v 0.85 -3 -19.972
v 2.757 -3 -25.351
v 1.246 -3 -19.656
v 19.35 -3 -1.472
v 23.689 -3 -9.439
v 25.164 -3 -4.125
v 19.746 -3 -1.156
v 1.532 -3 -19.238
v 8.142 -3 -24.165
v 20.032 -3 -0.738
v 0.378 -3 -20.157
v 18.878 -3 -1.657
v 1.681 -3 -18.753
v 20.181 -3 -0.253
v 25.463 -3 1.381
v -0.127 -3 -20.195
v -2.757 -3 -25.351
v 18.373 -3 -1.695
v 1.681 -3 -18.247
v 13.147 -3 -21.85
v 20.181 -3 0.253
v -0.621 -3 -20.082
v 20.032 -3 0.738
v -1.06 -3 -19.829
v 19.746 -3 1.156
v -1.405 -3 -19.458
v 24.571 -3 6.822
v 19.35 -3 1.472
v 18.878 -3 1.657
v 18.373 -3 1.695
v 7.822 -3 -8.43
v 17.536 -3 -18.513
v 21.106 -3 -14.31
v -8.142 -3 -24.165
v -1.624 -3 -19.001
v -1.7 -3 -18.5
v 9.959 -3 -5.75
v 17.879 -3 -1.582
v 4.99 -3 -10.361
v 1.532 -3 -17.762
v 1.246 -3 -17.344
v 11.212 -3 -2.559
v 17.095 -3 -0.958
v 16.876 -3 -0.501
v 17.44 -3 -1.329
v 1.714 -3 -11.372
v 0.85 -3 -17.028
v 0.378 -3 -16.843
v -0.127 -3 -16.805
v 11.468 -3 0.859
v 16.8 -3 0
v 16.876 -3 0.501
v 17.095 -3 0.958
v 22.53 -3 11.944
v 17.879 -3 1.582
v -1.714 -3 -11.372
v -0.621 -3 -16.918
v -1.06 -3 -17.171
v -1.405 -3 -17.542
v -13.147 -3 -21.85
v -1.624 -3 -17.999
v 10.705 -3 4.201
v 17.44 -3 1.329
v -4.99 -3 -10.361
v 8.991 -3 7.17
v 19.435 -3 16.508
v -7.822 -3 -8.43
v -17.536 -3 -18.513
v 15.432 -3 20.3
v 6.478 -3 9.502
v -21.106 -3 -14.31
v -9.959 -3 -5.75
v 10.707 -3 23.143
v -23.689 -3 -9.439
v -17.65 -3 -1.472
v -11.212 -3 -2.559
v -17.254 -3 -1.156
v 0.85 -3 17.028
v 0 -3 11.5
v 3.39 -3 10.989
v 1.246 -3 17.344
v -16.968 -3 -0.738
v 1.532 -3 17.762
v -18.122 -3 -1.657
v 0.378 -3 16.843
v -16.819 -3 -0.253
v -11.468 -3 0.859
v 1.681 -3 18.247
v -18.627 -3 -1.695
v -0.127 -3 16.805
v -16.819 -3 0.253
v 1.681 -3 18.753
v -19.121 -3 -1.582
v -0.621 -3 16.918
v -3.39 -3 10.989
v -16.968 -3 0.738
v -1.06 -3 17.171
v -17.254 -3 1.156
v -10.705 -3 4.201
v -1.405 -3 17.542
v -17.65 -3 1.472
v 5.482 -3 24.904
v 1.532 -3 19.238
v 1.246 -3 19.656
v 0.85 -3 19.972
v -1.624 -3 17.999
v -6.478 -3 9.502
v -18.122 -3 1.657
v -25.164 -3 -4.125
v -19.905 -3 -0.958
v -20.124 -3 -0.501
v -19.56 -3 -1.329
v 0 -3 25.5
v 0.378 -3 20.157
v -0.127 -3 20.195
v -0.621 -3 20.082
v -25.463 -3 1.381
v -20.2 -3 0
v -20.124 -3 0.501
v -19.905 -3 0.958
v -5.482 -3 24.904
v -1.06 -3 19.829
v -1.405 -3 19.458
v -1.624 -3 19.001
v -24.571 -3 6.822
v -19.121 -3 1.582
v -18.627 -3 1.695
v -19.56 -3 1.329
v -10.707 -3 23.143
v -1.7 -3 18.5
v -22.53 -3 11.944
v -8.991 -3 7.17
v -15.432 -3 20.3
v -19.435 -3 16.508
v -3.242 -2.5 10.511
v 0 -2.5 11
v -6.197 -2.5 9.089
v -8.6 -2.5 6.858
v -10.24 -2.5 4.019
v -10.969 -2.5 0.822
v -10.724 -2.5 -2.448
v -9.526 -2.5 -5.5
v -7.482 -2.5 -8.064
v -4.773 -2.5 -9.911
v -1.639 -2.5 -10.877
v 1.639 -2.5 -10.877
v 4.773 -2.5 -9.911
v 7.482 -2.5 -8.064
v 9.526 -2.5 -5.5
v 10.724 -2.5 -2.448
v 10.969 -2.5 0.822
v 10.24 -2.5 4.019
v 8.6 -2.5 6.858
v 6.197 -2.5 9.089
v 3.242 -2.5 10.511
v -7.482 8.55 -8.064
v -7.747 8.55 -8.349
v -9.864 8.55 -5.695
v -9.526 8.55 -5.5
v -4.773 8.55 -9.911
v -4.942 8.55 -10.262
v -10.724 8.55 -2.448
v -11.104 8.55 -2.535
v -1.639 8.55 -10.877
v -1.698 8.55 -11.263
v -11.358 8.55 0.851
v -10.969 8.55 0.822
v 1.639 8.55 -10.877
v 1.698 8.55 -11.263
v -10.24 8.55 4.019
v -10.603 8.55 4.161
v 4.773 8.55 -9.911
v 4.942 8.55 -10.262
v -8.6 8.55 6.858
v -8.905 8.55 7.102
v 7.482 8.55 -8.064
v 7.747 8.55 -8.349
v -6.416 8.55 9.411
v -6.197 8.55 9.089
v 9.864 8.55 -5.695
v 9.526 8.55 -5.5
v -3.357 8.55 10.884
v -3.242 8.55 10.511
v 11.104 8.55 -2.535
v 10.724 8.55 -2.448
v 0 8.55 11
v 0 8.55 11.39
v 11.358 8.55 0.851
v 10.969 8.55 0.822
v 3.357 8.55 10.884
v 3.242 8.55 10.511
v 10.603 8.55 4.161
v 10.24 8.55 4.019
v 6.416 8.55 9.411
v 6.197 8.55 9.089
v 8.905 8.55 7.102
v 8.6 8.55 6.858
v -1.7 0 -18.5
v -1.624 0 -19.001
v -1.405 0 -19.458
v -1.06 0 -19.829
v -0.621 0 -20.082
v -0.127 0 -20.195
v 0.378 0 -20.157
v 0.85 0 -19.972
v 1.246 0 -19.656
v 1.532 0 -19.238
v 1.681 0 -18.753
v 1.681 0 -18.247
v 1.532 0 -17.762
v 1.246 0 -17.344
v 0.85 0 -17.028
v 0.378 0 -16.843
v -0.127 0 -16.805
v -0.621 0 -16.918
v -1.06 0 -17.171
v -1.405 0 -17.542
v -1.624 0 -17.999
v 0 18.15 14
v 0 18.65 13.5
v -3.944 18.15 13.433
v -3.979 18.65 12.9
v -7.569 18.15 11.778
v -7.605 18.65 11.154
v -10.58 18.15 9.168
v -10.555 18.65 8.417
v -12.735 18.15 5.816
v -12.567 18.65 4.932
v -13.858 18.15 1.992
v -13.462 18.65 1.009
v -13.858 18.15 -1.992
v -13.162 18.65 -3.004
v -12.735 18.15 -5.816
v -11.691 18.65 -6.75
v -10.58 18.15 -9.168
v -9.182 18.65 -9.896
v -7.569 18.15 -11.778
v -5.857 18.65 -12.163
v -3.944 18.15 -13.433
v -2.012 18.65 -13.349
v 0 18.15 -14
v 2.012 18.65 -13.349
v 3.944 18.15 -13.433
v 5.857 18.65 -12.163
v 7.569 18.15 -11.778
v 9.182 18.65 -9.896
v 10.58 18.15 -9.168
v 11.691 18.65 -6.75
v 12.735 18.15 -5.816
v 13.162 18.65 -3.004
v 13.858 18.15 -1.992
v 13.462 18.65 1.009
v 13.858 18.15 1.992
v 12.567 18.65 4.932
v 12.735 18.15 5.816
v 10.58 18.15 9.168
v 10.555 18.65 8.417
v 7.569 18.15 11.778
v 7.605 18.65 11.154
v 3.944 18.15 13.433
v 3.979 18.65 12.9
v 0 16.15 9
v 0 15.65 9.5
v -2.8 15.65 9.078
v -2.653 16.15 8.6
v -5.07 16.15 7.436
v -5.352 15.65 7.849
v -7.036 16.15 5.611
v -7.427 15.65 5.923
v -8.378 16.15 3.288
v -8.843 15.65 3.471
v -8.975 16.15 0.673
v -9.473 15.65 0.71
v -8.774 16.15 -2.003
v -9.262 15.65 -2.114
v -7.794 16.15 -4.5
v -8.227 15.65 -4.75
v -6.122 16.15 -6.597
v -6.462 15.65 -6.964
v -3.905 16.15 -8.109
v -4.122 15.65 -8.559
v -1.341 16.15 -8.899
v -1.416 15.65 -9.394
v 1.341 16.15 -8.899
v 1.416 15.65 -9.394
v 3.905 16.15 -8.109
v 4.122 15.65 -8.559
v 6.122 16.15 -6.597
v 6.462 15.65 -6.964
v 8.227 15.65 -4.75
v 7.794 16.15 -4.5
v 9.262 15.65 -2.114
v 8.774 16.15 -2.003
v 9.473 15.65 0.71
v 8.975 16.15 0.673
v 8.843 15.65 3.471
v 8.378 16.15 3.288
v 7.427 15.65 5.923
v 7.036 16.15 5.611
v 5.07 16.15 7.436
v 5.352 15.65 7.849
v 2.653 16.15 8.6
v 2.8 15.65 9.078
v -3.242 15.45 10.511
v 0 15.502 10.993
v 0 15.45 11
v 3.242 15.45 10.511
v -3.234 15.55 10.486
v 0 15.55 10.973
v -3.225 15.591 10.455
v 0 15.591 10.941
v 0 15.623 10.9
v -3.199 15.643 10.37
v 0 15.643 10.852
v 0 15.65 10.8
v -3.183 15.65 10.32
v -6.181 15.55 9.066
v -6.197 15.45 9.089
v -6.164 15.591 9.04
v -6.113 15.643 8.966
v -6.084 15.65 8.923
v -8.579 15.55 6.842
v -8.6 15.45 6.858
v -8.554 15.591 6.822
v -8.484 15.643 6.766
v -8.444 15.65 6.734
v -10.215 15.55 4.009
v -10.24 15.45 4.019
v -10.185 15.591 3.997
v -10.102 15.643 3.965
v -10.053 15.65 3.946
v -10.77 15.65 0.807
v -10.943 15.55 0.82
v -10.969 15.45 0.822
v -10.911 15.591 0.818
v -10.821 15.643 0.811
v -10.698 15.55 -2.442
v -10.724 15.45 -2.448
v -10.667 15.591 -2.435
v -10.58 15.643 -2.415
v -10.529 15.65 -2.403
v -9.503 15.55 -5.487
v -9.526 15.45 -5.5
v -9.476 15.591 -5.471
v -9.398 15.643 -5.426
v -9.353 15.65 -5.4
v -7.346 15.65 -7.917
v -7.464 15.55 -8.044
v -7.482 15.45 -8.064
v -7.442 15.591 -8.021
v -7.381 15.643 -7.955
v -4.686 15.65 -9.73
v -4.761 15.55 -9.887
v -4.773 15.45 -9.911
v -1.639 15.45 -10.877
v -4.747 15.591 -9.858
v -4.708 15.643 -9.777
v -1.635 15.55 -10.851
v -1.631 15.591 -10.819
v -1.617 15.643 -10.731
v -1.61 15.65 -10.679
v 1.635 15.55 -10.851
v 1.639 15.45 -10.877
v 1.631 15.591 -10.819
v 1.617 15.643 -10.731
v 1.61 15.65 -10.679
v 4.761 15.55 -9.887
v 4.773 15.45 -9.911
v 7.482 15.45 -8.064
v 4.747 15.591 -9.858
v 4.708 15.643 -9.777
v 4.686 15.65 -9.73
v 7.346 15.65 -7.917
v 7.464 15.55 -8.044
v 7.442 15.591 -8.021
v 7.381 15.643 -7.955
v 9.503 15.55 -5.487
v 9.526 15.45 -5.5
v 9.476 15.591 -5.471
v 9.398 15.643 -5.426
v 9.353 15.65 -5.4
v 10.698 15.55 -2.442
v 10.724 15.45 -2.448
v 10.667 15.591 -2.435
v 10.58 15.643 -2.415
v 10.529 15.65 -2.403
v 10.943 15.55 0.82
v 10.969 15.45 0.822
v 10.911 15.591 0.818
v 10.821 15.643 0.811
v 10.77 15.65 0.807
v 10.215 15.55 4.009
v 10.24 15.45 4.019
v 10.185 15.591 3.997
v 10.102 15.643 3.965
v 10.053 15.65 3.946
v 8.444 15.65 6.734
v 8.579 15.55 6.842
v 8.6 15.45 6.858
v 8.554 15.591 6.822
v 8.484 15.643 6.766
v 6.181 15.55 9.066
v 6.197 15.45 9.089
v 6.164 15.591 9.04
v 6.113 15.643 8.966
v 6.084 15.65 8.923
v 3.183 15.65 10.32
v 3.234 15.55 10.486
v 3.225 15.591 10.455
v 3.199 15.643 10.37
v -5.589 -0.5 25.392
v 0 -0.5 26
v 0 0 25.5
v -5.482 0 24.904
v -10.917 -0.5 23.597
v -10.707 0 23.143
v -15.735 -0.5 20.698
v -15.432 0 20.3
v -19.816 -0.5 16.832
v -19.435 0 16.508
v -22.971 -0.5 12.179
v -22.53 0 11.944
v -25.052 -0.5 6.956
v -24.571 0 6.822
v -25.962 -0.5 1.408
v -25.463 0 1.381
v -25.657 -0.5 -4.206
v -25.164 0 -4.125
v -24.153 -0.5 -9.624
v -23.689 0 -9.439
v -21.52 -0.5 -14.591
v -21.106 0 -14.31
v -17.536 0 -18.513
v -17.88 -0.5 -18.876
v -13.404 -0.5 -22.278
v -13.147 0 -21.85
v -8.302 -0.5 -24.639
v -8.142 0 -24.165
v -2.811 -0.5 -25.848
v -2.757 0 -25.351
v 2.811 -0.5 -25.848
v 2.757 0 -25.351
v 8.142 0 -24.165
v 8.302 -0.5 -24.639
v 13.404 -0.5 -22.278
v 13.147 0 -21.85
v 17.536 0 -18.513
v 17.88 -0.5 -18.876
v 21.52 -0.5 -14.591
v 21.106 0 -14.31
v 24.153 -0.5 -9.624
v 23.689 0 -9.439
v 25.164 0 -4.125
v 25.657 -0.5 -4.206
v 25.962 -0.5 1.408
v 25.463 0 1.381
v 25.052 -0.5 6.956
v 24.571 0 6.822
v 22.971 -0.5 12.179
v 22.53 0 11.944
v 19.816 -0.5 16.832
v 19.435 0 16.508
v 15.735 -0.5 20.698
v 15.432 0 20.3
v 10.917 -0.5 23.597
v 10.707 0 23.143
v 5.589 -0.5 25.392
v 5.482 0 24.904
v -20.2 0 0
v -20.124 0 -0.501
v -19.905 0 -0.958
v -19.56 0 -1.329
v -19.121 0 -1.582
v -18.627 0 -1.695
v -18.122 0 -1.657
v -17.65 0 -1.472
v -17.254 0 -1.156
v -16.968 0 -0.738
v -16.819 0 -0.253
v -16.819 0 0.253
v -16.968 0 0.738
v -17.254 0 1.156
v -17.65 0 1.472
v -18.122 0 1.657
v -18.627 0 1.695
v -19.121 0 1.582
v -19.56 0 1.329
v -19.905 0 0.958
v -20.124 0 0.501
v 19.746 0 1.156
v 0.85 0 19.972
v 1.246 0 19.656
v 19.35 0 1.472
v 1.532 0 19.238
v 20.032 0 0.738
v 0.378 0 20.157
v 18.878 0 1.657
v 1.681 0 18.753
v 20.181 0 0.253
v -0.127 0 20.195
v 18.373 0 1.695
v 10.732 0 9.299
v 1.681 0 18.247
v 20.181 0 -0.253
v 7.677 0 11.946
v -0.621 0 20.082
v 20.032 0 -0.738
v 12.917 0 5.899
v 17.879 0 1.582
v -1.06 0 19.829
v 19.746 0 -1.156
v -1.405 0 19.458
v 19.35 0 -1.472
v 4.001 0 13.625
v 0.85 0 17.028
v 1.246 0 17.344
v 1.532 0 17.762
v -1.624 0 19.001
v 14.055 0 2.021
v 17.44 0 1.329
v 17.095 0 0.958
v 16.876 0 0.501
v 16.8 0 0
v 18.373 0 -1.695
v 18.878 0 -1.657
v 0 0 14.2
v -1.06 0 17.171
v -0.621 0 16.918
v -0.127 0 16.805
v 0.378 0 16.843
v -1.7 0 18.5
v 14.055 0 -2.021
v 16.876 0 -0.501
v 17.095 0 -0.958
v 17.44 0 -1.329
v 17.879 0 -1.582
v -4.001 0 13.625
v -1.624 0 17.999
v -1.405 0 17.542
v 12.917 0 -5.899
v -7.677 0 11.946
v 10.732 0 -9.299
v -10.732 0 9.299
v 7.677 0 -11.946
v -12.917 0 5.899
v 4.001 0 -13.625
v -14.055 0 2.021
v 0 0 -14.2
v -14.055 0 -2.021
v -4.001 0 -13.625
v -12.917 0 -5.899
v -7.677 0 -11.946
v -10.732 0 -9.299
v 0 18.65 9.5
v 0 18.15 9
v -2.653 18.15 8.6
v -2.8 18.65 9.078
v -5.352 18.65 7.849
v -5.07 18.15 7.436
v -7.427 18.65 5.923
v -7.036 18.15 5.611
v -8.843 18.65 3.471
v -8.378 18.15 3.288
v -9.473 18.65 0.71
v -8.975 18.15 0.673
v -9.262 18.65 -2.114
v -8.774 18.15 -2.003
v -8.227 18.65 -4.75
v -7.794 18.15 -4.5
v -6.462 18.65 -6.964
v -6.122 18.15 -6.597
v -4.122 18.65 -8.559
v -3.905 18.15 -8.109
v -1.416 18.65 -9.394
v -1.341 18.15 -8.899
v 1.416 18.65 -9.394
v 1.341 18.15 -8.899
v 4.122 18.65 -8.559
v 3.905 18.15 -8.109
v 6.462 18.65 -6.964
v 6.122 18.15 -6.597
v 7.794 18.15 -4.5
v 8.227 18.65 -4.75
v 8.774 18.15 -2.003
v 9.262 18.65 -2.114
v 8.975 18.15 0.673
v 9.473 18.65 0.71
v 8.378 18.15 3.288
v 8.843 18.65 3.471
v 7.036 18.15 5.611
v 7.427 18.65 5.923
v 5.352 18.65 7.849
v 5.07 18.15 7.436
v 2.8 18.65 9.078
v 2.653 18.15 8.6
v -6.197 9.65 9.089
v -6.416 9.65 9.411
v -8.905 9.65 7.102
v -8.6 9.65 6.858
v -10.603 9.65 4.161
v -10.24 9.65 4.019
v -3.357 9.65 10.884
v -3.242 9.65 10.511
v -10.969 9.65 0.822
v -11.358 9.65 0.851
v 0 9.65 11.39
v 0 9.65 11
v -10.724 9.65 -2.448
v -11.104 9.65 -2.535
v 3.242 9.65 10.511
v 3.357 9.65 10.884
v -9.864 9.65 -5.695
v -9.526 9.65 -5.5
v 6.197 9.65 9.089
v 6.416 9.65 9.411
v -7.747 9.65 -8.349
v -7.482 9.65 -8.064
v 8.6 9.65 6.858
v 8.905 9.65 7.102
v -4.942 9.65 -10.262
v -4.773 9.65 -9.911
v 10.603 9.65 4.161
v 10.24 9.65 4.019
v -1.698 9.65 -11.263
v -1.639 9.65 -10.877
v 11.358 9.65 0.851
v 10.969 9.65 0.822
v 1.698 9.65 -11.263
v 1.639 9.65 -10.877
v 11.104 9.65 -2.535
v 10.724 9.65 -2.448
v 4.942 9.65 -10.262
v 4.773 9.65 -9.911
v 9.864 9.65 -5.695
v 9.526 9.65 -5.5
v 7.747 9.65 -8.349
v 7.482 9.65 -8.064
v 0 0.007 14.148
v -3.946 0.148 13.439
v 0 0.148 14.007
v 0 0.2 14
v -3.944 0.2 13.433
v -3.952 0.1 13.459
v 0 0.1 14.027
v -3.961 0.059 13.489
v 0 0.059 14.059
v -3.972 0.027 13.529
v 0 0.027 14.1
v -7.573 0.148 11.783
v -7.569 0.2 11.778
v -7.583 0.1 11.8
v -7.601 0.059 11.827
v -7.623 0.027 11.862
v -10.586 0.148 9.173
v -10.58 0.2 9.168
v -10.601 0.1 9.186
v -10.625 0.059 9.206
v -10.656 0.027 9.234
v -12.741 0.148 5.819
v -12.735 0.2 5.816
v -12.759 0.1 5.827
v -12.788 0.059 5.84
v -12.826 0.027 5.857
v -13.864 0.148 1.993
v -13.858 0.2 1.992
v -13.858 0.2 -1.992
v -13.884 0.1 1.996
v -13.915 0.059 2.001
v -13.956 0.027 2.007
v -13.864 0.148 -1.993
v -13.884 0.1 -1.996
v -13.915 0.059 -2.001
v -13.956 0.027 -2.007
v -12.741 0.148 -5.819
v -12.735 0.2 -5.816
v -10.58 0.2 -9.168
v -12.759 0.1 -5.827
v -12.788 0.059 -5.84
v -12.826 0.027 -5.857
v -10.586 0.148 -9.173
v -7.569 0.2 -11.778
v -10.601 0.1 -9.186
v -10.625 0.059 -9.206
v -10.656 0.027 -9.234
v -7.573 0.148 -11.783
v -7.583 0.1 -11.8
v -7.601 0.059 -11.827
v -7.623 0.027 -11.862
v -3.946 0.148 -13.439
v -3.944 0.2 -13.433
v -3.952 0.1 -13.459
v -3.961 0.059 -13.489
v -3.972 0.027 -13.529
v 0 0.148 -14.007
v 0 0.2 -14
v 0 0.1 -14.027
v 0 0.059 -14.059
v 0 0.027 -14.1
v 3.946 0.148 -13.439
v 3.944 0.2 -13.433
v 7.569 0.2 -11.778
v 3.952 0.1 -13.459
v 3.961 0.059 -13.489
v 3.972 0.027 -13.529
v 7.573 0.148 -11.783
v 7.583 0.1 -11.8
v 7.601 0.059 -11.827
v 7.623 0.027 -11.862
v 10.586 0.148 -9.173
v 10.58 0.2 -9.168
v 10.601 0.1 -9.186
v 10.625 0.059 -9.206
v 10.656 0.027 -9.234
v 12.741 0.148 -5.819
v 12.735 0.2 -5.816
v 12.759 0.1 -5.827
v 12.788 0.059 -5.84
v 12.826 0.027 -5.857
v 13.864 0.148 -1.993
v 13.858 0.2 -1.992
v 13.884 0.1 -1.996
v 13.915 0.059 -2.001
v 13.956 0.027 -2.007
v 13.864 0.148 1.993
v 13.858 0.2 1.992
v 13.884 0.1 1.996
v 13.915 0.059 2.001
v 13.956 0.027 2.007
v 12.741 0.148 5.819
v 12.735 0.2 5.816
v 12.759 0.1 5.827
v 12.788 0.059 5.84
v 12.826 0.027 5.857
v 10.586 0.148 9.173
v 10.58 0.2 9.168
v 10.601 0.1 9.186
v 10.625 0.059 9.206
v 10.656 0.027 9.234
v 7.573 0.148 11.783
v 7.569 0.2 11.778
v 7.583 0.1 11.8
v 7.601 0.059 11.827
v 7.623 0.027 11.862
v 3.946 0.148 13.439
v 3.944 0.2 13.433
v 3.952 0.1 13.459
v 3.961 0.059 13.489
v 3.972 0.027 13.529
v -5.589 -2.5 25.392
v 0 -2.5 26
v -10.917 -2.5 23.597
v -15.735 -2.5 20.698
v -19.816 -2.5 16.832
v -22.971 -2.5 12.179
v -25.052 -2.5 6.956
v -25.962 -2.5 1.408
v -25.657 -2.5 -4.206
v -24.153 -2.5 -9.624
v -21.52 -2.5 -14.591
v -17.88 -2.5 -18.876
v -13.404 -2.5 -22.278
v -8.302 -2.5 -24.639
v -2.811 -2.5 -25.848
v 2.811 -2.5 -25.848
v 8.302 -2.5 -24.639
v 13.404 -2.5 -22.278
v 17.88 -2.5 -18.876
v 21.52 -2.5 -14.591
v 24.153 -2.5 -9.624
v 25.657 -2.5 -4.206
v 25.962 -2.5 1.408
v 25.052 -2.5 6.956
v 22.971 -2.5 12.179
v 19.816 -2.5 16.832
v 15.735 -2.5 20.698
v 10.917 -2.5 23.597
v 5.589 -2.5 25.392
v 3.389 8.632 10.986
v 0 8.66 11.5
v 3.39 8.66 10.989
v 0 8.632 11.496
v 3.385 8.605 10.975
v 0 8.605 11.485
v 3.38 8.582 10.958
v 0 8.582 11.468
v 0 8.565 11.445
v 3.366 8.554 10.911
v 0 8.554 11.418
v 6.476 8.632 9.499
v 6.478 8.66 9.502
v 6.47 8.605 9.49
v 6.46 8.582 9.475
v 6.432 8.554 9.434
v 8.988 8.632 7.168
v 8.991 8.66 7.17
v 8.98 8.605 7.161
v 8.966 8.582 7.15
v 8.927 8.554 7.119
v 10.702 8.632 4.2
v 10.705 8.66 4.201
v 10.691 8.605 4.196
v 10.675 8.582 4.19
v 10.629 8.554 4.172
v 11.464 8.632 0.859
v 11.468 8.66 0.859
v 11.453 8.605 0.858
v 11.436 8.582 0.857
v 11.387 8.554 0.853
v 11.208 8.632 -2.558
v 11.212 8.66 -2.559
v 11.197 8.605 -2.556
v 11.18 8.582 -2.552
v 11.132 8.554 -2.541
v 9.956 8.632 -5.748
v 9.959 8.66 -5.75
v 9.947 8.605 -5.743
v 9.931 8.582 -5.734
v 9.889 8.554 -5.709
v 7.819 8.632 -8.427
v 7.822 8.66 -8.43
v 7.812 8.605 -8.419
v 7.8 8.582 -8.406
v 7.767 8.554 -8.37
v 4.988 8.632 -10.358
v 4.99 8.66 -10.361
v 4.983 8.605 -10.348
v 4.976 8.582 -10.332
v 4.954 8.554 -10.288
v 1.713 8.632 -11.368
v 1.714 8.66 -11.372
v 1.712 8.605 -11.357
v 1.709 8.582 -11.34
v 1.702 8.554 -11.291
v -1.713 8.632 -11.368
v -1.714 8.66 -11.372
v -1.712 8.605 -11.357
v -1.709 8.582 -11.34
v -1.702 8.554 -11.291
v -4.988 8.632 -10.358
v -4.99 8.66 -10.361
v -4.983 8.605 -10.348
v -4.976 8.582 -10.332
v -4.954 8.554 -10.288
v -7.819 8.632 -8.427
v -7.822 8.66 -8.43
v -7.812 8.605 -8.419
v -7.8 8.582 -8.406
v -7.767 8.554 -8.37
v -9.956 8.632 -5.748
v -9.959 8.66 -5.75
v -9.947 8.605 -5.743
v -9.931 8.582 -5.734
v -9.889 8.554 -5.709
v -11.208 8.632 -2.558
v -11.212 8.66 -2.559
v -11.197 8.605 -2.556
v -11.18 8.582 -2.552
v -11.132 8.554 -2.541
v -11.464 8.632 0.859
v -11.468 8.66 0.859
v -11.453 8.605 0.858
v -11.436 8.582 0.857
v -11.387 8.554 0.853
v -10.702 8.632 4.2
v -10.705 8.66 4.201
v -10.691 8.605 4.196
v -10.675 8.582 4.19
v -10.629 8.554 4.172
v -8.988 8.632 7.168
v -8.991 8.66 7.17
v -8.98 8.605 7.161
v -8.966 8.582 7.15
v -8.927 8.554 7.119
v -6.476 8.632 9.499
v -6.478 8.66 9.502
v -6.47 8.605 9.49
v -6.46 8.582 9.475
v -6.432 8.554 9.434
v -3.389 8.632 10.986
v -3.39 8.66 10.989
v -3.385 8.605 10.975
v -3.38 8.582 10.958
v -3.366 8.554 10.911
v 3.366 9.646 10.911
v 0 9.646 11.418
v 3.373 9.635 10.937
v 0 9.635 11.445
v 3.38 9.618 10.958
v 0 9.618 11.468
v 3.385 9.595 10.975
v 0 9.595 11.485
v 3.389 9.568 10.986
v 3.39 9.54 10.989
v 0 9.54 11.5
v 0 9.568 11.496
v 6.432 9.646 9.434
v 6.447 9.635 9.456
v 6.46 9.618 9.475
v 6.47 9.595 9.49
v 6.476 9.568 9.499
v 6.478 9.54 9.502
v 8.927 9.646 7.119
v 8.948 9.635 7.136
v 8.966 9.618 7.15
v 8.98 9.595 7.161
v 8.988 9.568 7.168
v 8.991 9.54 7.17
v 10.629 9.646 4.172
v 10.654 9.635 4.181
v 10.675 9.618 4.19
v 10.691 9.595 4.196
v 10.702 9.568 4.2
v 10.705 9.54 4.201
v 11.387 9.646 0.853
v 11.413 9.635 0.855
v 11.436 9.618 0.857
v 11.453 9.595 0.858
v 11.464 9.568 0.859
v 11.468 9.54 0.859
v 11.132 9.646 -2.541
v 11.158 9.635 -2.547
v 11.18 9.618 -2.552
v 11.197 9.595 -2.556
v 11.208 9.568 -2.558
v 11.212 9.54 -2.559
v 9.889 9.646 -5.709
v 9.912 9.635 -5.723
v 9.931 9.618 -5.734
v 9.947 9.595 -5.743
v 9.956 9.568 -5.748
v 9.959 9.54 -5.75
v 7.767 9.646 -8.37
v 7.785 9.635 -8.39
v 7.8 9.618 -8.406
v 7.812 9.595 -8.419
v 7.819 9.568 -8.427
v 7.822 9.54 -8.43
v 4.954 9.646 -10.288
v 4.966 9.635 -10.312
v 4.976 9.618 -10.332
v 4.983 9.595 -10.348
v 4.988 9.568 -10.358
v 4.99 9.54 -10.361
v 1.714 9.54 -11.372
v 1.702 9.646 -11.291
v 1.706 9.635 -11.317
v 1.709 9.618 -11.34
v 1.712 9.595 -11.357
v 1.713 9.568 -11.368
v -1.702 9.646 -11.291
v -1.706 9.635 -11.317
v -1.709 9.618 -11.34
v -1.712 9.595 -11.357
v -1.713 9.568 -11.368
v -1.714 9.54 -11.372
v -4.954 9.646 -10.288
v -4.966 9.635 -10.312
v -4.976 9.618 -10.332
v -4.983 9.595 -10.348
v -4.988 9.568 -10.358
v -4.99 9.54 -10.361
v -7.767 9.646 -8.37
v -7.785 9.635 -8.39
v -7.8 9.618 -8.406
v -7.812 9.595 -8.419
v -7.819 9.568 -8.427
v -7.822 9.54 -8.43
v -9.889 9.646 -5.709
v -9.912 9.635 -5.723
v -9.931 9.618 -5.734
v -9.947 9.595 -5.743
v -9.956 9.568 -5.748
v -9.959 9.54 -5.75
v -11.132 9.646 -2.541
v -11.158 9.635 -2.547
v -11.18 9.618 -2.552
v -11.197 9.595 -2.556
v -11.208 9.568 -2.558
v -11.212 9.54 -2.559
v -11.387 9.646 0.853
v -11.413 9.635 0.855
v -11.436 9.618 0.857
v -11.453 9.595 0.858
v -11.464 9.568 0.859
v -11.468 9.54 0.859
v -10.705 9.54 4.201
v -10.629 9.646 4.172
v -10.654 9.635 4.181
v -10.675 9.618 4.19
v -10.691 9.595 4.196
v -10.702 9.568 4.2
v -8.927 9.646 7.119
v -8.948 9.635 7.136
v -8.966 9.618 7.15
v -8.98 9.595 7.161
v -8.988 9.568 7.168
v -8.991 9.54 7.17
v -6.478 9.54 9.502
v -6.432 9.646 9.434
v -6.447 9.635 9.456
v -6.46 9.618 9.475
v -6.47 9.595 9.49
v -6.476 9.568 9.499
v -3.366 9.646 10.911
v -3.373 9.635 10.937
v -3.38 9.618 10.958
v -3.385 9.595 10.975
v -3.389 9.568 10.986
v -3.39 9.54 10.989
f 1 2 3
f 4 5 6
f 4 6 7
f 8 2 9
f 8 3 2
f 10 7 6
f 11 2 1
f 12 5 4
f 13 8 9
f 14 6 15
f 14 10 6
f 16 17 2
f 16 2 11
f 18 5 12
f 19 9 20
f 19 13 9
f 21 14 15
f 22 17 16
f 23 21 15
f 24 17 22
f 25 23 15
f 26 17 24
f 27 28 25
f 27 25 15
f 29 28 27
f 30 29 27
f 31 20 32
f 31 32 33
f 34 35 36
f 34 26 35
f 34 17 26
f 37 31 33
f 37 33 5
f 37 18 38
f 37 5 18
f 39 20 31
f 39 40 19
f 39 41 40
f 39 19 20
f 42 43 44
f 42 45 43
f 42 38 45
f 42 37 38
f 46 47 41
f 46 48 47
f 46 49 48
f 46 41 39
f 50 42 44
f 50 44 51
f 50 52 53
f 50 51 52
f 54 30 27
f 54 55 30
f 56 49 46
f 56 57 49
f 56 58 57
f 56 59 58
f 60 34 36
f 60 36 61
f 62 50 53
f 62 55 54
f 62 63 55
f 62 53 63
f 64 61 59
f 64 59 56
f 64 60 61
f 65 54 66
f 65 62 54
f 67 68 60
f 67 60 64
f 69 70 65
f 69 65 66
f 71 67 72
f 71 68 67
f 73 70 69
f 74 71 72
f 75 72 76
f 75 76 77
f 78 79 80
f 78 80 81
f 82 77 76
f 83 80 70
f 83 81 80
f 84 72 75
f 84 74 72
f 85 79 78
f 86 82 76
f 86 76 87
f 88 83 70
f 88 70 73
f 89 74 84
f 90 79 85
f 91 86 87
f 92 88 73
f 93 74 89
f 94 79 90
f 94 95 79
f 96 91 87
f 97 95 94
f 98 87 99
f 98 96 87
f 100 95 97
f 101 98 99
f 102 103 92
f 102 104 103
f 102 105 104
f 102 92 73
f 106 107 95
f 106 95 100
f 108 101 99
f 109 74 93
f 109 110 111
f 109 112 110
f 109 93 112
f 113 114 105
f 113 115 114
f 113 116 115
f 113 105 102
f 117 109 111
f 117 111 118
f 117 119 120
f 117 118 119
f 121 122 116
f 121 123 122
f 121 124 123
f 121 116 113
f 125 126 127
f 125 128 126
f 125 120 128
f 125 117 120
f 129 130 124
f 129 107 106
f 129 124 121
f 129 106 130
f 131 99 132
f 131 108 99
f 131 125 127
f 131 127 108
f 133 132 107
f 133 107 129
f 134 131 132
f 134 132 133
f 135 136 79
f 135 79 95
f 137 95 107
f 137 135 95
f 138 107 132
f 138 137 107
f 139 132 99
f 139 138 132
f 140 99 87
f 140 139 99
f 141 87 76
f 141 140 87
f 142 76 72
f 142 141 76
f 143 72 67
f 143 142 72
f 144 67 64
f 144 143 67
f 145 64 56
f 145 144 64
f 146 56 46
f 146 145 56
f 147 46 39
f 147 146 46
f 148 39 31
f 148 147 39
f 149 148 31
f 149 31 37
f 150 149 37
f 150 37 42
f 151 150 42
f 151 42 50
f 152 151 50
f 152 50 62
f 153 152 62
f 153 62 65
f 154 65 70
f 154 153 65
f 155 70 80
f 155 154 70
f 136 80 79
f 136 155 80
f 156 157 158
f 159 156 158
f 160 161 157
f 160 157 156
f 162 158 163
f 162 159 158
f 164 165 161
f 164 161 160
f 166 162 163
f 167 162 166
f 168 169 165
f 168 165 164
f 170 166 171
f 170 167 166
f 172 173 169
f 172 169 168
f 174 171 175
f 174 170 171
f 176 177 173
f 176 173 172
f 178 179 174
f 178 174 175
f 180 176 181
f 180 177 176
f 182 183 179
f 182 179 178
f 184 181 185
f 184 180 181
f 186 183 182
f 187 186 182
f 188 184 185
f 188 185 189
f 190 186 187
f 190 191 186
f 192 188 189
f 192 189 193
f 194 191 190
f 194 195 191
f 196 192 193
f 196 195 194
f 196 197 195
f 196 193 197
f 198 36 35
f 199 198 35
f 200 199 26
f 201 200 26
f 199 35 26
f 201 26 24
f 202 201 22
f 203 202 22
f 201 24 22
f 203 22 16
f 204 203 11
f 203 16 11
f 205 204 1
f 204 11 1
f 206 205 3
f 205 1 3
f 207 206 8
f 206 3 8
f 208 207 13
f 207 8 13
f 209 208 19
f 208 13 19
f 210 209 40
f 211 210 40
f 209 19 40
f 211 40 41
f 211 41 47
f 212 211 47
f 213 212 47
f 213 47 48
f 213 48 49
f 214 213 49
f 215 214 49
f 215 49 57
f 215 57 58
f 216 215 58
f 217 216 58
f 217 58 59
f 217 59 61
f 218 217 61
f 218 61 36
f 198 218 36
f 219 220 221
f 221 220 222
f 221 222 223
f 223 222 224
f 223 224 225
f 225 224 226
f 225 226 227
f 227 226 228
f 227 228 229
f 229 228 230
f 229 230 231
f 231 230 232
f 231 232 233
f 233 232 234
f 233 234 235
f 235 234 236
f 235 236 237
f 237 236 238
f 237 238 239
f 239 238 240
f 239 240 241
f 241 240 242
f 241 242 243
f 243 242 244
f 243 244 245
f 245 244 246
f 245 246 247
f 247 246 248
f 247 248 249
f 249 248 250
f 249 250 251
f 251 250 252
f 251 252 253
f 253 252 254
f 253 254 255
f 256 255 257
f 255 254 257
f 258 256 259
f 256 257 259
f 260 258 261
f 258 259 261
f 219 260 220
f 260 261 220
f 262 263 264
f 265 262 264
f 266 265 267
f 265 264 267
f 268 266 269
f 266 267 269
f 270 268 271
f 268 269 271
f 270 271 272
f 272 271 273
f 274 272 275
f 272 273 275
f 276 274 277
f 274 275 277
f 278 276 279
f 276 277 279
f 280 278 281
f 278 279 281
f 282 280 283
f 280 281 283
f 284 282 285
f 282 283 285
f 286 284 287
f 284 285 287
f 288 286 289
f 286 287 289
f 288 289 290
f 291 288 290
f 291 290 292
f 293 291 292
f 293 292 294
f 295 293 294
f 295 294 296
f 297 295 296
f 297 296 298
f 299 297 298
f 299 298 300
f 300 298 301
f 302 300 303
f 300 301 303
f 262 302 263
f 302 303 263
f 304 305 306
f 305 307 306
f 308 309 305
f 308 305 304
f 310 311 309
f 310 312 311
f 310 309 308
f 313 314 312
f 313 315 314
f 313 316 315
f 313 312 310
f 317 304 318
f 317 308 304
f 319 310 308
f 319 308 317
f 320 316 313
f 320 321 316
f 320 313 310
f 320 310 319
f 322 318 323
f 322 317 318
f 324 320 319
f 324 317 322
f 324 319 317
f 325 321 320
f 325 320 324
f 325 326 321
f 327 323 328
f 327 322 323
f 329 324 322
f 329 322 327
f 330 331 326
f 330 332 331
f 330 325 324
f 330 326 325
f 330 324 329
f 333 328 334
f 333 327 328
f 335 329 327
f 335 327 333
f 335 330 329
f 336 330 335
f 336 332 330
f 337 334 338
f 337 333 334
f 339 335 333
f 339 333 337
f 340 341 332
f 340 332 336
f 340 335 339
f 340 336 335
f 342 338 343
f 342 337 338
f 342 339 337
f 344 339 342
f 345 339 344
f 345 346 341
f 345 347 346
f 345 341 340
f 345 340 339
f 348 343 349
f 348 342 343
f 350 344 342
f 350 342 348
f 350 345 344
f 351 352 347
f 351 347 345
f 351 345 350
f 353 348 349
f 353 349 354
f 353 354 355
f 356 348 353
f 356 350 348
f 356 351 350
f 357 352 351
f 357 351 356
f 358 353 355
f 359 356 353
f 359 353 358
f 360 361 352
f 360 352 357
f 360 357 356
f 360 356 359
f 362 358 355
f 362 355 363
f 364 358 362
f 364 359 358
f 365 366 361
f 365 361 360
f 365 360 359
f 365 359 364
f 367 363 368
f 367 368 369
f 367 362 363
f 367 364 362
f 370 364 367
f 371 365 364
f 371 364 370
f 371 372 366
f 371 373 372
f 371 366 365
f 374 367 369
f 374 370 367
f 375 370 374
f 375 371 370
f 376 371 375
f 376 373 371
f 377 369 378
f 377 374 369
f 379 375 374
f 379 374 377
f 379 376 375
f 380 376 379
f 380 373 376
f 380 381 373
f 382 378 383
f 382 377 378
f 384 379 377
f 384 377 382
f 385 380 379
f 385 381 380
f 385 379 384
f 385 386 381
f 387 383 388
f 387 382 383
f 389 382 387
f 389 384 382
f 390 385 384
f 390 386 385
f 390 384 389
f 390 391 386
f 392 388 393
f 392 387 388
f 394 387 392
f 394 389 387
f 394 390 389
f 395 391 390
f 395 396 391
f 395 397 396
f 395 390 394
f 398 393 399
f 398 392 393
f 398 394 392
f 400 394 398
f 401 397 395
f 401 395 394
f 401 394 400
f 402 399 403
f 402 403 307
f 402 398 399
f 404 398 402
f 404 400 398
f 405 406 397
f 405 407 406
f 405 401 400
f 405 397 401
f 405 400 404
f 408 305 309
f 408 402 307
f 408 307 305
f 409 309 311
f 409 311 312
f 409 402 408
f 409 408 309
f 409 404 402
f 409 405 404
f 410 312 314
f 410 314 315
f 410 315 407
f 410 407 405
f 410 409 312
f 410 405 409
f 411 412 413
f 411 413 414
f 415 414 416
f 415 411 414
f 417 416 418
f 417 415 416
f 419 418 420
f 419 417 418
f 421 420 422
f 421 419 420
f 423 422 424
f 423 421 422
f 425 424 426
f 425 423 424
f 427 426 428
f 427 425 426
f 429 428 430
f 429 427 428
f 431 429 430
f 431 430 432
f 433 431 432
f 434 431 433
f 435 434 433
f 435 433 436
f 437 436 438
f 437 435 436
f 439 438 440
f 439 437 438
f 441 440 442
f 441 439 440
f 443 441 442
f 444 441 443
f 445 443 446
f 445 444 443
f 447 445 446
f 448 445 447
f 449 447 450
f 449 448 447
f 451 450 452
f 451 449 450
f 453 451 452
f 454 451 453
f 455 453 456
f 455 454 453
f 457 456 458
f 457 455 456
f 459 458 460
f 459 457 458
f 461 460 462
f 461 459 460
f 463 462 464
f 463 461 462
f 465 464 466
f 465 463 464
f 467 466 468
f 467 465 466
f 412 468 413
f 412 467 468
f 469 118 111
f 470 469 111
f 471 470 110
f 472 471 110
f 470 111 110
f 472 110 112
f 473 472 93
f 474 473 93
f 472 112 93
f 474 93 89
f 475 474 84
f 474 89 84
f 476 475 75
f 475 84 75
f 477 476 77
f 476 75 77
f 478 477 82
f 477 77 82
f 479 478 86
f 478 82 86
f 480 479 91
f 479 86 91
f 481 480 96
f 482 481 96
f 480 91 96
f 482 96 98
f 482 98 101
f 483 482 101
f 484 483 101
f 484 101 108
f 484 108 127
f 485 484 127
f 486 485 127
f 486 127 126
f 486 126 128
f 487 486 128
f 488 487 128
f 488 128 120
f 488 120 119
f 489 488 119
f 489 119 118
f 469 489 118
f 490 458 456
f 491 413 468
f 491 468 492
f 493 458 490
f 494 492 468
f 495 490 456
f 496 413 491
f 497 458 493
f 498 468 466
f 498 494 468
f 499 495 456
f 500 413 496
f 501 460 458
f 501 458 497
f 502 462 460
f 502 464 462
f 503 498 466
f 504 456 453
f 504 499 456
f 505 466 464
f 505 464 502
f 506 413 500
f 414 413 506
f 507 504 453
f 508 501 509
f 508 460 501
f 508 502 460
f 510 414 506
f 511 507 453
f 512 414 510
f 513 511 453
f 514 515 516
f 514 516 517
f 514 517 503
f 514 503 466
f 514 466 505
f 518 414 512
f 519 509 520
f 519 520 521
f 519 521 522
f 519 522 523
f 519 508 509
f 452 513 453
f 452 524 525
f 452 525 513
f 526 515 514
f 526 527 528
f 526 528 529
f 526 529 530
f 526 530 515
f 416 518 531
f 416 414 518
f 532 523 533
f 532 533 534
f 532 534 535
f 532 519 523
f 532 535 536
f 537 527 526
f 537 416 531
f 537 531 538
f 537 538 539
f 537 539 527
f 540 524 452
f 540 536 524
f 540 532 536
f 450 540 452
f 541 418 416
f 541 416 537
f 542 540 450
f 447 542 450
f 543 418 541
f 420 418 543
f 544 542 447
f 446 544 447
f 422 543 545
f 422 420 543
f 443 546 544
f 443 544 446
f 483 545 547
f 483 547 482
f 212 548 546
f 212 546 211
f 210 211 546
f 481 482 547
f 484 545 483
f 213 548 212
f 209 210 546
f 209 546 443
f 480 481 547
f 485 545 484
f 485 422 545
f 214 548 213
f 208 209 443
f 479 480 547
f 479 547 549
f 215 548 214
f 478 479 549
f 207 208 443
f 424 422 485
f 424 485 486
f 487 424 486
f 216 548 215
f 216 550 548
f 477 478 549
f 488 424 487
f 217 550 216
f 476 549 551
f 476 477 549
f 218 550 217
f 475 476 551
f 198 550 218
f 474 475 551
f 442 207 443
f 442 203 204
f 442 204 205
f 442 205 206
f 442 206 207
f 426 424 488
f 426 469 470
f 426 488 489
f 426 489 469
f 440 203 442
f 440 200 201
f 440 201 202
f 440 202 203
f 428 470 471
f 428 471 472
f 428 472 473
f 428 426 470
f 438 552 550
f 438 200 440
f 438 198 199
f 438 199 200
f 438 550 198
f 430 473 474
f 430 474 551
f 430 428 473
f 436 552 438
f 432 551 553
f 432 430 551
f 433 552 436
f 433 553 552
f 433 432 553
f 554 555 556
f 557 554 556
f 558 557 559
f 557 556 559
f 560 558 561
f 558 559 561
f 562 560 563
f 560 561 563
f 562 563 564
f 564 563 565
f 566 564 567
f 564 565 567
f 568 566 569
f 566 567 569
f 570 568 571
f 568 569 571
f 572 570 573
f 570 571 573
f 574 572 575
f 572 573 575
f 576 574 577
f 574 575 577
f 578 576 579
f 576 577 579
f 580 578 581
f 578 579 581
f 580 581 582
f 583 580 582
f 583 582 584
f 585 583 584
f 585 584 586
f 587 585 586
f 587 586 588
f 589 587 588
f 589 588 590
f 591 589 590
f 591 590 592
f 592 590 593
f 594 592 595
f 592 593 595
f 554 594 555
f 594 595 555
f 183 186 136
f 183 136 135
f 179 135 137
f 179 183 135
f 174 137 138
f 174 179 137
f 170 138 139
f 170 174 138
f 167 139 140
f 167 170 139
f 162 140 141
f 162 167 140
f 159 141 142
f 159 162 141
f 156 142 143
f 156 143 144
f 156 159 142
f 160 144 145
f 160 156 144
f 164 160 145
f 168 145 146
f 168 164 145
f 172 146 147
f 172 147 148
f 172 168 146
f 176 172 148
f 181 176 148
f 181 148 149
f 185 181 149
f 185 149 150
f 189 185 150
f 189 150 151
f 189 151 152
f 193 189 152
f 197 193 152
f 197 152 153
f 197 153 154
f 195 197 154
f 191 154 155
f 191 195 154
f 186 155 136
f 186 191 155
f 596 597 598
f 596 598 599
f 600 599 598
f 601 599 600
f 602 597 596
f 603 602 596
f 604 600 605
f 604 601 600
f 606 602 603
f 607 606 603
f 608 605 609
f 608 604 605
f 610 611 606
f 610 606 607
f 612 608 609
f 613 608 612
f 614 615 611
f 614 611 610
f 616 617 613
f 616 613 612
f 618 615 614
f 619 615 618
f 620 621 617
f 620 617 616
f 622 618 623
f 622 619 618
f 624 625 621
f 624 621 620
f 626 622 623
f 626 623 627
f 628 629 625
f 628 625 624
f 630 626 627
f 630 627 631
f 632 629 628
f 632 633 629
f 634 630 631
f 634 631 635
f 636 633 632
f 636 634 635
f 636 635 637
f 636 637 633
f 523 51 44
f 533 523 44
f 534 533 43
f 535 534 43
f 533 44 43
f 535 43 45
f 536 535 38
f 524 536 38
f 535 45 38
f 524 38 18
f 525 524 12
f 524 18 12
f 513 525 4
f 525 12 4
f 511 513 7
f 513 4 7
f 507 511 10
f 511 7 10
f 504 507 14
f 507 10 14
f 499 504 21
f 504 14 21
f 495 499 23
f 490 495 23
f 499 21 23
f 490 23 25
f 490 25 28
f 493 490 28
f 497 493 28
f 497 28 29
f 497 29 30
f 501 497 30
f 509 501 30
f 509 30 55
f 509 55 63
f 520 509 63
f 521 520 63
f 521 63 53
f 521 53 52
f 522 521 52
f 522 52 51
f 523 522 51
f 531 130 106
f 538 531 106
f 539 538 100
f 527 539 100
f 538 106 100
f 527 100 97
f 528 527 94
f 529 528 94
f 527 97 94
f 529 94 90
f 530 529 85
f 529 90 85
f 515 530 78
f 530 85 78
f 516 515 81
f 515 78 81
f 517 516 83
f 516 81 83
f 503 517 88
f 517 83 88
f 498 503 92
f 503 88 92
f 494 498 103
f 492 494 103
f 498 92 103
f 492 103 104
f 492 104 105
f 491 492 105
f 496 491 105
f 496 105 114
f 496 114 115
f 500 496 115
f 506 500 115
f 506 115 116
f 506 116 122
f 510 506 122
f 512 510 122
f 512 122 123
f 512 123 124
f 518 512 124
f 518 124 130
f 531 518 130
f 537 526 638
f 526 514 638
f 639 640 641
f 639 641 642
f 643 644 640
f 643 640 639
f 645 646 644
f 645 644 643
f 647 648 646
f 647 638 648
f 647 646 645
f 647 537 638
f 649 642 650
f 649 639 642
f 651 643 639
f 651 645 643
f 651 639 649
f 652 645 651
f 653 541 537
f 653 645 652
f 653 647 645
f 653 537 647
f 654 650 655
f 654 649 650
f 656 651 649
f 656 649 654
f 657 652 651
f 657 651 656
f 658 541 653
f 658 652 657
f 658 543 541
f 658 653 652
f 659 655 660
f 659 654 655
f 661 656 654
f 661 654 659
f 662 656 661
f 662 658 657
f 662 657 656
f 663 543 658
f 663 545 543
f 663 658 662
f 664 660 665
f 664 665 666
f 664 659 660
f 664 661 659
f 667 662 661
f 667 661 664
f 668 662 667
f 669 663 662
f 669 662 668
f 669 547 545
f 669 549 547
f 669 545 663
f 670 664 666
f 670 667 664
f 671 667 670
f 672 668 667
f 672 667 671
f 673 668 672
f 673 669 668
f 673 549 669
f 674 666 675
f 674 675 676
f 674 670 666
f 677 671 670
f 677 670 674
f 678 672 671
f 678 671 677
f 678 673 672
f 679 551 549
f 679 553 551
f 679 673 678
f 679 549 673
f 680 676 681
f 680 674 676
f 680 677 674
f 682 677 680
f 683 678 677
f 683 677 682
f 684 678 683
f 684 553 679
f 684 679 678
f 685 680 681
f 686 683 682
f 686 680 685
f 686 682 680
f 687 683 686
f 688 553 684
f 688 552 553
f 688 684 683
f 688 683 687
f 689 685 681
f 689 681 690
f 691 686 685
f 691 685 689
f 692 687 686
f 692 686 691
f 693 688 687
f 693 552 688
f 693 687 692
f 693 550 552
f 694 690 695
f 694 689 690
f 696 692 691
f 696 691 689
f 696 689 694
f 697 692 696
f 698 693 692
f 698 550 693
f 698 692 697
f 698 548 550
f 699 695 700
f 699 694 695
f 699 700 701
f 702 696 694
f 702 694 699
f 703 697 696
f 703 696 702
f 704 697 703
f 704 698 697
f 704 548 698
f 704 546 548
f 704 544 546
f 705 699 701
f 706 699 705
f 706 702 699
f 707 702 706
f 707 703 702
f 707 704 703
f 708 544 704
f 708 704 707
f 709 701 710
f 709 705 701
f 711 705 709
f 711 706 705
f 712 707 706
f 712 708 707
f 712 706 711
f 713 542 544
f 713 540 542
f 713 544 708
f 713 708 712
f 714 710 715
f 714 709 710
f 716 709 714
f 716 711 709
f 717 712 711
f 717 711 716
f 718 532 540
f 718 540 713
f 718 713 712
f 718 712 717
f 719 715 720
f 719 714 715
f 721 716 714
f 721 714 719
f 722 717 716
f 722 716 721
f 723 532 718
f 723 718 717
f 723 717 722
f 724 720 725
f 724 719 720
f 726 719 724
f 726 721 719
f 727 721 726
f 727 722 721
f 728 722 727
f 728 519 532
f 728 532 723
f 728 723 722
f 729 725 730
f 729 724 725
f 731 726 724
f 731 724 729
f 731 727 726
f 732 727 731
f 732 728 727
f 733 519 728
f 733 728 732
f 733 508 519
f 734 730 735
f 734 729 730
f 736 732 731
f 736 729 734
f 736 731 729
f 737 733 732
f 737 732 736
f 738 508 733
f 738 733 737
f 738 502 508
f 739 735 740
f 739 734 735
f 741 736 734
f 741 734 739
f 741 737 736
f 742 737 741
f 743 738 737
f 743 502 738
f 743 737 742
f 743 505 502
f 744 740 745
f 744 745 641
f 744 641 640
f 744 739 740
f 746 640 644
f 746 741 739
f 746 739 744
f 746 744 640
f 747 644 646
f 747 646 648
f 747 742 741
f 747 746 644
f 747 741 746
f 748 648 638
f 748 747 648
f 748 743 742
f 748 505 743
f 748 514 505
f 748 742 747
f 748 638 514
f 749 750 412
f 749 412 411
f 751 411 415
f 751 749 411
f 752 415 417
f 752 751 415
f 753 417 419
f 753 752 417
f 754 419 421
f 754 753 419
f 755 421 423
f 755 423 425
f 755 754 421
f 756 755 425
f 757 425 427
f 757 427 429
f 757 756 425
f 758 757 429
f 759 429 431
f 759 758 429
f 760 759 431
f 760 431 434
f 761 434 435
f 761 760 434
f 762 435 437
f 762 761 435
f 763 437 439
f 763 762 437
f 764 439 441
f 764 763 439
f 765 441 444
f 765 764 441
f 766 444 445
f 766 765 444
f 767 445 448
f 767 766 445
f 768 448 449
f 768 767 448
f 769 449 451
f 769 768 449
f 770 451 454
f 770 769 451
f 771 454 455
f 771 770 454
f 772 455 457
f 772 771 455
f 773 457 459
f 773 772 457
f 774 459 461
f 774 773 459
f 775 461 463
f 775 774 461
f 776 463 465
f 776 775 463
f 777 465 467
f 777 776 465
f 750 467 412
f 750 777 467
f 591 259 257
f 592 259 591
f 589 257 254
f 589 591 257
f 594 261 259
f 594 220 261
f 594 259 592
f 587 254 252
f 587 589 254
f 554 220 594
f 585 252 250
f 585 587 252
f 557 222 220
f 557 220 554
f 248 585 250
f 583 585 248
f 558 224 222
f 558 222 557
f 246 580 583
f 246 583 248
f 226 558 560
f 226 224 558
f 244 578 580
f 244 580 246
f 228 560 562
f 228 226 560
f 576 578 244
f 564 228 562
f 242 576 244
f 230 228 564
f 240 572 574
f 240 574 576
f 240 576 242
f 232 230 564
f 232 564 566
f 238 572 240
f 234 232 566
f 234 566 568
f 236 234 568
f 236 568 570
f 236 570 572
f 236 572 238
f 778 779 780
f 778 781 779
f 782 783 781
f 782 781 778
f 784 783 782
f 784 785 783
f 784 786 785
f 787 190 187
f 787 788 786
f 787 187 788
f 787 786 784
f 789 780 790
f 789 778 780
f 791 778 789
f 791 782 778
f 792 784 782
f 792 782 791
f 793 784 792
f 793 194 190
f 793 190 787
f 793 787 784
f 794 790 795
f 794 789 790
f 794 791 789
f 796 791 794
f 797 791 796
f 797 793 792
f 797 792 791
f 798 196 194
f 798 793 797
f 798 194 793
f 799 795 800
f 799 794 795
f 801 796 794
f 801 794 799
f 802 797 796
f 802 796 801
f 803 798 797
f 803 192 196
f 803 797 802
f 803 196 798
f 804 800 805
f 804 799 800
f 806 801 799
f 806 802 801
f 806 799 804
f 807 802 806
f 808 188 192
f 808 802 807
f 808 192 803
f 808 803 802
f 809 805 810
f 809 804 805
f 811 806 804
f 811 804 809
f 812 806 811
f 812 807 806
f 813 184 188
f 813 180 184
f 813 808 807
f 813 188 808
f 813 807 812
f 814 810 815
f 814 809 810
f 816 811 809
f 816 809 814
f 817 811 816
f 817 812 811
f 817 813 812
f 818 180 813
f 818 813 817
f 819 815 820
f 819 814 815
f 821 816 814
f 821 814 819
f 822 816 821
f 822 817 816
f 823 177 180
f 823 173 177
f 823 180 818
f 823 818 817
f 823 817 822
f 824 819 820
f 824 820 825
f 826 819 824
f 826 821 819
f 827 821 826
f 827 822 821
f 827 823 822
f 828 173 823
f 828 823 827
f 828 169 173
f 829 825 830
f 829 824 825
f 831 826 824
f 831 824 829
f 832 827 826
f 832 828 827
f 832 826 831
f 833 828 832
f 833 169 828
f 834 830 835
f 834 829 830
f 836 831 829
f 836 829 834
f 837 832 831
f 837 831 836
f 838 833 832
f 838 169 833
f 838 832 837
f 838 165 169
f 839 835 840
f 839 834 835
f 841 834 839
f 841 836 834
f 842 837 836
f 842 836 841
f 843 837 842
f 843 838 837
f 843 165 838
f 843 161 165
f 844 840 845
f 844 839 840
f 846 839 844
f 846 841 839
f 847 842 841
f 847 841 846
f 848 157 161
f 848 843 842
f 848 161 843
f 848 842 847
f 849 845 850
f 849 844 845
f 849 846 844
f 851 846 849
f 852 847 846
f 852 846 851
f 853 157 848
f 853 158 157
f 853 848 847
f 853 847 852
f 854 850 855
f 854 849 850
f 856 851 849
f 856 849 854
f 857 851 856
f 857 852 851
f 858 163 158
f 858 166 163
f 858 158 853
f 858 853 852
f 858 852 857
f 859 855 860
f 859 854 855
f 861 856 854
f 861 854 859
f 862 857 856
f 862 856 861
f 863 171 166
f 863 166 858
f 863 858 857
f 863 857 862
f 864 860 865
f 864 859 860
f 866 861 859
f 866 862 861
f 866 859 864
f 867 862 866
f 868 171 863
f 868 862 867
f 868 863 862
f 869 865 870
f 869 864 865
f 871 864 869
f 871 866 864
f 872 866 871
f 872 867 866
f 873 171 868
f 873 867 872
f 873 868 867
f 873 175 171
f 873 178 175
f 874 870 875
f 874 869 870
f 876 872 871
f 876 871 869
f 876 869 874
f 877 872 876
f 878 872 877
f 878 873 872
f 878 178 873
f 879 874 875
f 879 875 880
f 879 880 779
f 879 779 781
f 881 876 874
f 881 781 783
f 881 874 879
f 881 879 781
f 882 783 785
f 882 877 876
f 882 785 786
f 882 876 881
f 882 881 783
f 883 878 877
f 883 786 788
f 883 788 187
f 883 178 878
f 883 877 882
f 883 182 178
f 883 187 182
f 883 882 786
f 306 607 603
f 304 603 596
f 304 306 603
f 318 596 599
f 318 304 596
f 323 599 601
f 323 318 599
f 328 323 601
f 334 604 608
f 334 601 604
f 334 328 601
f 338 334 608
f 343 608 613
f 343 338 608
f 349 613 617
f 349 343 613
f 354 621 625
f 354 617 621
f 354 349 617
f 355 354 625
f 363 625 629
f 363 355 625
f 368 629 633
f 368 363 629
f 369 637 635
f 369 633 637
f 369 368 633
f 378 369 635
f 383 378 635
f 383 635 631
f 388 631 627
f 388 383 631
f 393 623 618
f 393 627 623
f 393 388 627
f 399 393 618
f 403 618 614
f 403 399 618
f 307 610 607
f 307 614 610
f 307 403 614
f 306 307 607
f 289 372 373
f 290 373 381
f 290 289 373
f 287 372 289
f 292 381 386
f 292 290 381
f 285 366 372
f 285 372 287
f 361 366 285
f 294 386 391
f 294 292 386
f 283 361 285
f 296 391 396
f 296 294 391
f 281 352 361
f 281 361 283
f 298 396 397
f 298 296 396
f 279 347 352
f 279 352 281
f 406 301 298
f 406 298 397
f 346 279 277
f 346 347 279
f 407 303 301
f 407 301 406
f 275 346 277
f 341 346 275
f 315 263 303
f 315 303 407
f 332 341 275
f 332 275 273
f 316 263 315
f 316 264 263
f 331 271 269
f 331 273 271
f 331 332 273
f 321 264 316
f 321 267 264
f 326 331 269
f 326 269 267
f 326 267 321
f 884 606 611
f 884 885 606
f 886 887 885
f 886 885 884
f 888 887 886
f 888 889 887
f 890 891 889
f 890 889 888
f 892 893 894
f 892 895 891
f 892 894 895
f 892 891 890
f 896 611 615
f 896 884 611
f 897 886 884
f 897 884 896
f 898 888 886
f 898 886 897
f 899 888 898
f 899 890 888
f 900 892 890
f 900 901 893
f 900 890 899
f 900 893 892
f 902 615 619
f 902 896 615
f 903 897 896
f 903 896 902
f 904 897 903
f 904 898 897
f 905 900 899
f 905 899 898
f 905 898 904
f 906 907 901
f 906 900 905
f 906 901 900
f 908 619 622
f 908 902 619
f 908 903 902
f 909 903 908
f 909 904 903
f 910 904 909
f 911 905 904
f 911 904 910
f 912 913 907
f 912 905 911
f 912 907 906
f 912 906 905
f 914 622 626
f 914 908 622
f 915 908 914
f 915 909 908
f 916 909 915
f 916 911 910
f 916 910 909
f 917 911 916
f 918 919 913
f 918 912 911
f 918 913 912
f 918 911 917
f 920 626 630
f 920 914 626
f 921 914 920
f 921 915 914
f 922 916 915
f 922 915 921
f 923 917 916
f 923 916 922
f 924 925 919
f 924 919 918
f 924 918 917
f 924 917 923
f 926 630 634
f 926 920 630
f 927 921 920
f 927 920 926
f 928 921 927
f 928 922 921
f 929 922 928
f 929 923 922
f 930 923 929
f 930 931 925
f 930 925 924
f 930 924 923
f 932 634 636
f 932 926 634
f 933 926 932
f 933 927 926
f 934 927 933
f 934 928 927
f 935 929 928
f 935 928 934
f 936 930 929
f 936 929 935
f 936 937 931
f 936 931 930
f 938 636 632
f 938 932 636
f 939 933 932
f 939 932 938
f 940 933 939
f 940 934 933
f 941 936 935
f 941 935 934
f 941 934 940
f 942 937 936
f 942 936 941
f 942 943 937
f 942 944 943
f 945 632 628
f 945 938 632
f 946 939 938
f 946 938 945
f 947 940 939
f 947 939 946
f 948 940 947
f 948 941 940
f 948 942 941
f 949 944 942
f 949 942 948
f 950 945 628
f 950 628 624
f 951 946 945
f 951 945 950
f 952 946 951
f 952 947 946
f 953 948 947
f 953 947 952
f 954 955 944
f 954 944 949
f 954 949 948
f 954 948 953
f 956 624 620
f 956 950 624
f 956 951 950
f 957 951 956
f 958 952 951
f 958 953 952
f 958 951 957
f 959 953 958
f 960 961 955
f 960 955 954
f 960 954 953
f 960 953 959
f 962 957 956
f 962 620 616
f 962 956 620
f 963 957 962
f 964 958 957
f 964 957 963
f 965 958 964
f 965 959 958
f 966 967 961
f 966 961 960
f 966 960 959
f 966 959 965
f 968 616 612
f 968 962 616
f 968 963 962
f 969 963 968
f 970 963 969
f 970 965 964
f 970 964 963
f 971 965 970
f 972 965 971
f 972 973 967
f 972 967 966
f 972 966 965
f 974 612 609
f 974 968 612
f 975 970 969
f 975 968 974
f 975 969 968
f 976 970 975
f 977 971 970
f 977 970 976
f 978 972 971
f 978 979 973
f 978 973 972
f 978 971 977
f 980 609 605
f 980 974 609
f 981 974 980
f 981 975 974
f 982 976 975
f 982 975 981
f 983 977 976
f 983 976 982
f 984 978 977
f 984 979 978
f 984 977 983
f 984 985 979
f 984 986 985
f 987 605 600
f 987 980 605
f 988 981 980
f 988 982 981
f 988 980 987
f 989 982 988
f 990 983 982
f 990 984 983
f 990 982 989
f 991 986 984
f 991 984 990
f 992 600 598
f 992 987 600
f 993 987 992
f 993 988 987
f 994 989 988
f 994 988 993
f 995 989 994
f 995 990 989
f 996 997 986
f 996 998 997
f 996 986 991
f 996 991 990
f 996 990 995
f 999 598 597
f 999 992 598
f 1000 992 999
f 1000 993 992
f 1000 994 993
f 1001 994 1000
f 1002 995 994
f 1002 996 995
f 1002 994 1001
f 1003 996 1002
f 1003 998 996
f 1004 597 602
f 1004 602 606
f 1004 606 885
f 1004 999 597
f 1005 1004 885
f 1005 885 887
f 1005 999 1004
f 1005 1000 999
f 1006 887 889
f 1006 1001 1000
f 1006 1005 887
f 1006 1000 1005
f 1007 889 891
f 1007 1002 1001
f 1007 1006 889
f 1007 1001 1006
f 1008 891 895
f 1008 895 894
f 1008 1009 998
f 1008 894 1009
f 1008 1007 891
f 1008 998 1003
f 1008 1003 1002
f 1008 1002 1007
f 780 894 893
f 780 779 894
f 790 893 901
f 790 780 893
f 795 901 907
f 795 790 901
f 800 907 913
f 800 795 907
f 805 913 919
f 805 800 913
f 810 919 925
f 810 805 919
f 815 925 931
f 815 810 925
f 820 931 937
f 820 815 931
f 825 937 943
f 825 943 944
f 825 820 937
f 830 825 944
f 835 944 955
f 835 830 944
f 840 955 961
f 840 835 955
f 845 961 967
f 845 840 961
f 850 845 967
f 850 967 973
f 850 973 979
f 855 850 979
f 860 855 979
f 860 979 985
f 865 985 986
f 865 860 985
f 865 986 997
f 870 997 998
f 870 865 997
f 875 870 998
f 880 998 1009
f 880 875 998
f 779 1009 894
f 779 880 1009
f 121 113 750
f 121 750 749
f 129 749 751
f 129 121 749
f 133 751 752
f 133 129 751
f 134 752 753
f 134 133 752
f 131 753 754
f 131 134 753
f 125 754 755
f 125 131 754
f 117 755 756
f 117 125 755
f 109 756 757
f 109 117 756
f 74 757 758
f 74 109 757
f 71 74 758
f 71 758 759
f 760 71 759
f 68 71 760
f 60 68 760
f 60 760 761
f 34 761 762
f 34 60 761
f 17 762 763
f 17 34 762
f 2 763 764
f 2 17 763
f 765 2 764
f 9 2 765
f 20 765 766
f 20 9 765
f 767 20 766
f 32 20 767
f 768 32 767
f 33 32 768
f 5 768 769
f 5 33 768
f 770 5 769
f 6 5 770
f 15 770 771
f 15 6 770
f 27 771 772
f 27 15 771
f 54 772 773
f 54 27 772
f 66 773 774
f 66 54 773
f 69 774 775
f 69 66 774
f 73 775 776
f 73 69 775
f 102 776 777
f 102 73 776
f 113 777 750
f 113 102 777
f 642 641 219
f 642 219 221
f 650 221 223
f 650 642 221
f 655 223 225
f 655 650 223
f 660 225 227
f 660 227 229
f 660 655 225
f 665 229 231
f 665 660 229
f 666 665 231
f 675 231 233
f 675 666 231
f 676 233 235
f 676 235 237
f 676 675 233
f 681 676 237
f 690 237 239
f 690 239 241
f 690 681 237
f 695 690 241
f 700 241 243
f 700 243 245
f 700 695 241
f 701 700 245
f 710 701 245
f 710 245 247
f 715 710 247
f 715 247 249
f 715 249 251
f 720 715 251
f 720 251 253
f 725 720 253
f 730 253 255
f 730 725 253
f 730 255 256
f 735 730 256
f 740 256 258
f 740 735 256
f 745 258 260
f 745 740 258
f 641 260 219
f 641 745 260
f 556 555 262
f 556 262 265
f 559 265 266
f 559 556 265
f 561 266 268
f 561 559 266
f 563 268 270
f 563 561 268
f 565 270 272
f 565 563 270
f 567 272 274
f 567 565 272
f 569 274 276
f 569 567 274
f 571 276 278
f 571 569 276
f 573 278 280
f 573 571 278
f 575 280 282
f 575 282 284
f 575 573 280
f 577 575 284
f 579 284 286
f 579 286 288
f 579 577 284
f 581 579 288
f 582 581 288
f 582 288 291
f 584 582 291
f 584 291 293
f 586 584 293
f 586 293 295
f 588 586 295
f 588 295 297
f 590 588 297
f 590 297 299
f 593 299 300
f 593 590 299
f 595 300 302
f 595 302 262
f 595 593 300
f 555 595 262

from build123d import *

# Parameters (mm, degrees)
M3_CLEARANCE_HOLE1_D = 3.4
FILLET1_R            = 0.2
FILLET2_R            = 0.2
CHAMFER1_SIZE        = 0.5


with BuildPart() as part:
    # Sketch1 → Revolve1 (revolve)
    with BuildSketch(Plane.XY, mode=Mode.PRIVATE) as revolve1_sk:
        Polygon((11, -3), (11, 15.65), (9, 15.65), (9, 18.65), (14, 18.65), (14, 0), (26, 0), (26, -3), align=None)
    revolve(revolve1_sk.sketch.rotate(Axis((0, 17.954019247, 0), (0, -1, 0)), 90), axis=Axis((0, 17.954019247, 0), (0, -1, 0)))

    # Sketch4 → Groove for BS 3673 P4 - B022M, Internal Circlip1 (revolve, cut)
    with BuildSketch(Plane(origin=(0, 17.954019247, 0), x_dir=(0, 0, 1), z_dir=(-1, 0, 0))):
        with BuildLine():
            Line((11.39, -9.404019247), (9.9, -9.404019247))
            Line((9.9, -9.404019247), (9.9, -8.304019247))
            Line((9.9, -8.304019247), (11.39, -8.304019247))
            ThreePointArc((11.39, -8.304019247), (11.467781746, -8.336237501), (11.5, -8.414019247))
            Line((11.5, -8.414019247), (11.5, -9.294019247))
            ThreePointArc((11.5, -9.294019247), (11.467781746, -9.371800993), (11.39, -9.404019247))
        make_face()
    revolve(axis=Axis((0, -32.045980753, 0), (0, 1, 0)), mode=Mode.SUBTRACT)

    # M3 Clearance Hole1 (through all)
    with Locations(Plane(origin=(0, 0, 0), x_dir=(1, 0, 0), z_dir=(0, 1, 0))):
        with Locations((0, 18.5), (18.5, 0), (0, -18.5), (-18.5, 0)):
            Hole(M3_CLEARANCE_HOLE1_D / 2)

    # Fillet1
    fillet1_edges = [part.edges().sort_by_distance(p)[0] for p in [
        (0, 15.65, -11),
    ]]
    fillet(fillet1_edges, radius=FILLET1_R)

    # Fillet2
    fillet2_edges = [part.edges().sort_by_distance(p)[0] for p in [
        (0, 0, -14),
    ]]
    fillet(fillet2_edges, radius=FILLET2_R)

    # Chamfer1
    chamfer1_edges = [part.edges().sort_by_distance(p)[0] for p in [
        (0, 15.65, -9),
        (0, 18.65, -9),
        (0, 18.65, -14),
        (0, 0, -26),
        (0, -3, -26),
        (0, -3, -11),
    ]]
    chamfer(chamfer1_edges, length=CHAMFER1_SIZE)


solid = part.part
